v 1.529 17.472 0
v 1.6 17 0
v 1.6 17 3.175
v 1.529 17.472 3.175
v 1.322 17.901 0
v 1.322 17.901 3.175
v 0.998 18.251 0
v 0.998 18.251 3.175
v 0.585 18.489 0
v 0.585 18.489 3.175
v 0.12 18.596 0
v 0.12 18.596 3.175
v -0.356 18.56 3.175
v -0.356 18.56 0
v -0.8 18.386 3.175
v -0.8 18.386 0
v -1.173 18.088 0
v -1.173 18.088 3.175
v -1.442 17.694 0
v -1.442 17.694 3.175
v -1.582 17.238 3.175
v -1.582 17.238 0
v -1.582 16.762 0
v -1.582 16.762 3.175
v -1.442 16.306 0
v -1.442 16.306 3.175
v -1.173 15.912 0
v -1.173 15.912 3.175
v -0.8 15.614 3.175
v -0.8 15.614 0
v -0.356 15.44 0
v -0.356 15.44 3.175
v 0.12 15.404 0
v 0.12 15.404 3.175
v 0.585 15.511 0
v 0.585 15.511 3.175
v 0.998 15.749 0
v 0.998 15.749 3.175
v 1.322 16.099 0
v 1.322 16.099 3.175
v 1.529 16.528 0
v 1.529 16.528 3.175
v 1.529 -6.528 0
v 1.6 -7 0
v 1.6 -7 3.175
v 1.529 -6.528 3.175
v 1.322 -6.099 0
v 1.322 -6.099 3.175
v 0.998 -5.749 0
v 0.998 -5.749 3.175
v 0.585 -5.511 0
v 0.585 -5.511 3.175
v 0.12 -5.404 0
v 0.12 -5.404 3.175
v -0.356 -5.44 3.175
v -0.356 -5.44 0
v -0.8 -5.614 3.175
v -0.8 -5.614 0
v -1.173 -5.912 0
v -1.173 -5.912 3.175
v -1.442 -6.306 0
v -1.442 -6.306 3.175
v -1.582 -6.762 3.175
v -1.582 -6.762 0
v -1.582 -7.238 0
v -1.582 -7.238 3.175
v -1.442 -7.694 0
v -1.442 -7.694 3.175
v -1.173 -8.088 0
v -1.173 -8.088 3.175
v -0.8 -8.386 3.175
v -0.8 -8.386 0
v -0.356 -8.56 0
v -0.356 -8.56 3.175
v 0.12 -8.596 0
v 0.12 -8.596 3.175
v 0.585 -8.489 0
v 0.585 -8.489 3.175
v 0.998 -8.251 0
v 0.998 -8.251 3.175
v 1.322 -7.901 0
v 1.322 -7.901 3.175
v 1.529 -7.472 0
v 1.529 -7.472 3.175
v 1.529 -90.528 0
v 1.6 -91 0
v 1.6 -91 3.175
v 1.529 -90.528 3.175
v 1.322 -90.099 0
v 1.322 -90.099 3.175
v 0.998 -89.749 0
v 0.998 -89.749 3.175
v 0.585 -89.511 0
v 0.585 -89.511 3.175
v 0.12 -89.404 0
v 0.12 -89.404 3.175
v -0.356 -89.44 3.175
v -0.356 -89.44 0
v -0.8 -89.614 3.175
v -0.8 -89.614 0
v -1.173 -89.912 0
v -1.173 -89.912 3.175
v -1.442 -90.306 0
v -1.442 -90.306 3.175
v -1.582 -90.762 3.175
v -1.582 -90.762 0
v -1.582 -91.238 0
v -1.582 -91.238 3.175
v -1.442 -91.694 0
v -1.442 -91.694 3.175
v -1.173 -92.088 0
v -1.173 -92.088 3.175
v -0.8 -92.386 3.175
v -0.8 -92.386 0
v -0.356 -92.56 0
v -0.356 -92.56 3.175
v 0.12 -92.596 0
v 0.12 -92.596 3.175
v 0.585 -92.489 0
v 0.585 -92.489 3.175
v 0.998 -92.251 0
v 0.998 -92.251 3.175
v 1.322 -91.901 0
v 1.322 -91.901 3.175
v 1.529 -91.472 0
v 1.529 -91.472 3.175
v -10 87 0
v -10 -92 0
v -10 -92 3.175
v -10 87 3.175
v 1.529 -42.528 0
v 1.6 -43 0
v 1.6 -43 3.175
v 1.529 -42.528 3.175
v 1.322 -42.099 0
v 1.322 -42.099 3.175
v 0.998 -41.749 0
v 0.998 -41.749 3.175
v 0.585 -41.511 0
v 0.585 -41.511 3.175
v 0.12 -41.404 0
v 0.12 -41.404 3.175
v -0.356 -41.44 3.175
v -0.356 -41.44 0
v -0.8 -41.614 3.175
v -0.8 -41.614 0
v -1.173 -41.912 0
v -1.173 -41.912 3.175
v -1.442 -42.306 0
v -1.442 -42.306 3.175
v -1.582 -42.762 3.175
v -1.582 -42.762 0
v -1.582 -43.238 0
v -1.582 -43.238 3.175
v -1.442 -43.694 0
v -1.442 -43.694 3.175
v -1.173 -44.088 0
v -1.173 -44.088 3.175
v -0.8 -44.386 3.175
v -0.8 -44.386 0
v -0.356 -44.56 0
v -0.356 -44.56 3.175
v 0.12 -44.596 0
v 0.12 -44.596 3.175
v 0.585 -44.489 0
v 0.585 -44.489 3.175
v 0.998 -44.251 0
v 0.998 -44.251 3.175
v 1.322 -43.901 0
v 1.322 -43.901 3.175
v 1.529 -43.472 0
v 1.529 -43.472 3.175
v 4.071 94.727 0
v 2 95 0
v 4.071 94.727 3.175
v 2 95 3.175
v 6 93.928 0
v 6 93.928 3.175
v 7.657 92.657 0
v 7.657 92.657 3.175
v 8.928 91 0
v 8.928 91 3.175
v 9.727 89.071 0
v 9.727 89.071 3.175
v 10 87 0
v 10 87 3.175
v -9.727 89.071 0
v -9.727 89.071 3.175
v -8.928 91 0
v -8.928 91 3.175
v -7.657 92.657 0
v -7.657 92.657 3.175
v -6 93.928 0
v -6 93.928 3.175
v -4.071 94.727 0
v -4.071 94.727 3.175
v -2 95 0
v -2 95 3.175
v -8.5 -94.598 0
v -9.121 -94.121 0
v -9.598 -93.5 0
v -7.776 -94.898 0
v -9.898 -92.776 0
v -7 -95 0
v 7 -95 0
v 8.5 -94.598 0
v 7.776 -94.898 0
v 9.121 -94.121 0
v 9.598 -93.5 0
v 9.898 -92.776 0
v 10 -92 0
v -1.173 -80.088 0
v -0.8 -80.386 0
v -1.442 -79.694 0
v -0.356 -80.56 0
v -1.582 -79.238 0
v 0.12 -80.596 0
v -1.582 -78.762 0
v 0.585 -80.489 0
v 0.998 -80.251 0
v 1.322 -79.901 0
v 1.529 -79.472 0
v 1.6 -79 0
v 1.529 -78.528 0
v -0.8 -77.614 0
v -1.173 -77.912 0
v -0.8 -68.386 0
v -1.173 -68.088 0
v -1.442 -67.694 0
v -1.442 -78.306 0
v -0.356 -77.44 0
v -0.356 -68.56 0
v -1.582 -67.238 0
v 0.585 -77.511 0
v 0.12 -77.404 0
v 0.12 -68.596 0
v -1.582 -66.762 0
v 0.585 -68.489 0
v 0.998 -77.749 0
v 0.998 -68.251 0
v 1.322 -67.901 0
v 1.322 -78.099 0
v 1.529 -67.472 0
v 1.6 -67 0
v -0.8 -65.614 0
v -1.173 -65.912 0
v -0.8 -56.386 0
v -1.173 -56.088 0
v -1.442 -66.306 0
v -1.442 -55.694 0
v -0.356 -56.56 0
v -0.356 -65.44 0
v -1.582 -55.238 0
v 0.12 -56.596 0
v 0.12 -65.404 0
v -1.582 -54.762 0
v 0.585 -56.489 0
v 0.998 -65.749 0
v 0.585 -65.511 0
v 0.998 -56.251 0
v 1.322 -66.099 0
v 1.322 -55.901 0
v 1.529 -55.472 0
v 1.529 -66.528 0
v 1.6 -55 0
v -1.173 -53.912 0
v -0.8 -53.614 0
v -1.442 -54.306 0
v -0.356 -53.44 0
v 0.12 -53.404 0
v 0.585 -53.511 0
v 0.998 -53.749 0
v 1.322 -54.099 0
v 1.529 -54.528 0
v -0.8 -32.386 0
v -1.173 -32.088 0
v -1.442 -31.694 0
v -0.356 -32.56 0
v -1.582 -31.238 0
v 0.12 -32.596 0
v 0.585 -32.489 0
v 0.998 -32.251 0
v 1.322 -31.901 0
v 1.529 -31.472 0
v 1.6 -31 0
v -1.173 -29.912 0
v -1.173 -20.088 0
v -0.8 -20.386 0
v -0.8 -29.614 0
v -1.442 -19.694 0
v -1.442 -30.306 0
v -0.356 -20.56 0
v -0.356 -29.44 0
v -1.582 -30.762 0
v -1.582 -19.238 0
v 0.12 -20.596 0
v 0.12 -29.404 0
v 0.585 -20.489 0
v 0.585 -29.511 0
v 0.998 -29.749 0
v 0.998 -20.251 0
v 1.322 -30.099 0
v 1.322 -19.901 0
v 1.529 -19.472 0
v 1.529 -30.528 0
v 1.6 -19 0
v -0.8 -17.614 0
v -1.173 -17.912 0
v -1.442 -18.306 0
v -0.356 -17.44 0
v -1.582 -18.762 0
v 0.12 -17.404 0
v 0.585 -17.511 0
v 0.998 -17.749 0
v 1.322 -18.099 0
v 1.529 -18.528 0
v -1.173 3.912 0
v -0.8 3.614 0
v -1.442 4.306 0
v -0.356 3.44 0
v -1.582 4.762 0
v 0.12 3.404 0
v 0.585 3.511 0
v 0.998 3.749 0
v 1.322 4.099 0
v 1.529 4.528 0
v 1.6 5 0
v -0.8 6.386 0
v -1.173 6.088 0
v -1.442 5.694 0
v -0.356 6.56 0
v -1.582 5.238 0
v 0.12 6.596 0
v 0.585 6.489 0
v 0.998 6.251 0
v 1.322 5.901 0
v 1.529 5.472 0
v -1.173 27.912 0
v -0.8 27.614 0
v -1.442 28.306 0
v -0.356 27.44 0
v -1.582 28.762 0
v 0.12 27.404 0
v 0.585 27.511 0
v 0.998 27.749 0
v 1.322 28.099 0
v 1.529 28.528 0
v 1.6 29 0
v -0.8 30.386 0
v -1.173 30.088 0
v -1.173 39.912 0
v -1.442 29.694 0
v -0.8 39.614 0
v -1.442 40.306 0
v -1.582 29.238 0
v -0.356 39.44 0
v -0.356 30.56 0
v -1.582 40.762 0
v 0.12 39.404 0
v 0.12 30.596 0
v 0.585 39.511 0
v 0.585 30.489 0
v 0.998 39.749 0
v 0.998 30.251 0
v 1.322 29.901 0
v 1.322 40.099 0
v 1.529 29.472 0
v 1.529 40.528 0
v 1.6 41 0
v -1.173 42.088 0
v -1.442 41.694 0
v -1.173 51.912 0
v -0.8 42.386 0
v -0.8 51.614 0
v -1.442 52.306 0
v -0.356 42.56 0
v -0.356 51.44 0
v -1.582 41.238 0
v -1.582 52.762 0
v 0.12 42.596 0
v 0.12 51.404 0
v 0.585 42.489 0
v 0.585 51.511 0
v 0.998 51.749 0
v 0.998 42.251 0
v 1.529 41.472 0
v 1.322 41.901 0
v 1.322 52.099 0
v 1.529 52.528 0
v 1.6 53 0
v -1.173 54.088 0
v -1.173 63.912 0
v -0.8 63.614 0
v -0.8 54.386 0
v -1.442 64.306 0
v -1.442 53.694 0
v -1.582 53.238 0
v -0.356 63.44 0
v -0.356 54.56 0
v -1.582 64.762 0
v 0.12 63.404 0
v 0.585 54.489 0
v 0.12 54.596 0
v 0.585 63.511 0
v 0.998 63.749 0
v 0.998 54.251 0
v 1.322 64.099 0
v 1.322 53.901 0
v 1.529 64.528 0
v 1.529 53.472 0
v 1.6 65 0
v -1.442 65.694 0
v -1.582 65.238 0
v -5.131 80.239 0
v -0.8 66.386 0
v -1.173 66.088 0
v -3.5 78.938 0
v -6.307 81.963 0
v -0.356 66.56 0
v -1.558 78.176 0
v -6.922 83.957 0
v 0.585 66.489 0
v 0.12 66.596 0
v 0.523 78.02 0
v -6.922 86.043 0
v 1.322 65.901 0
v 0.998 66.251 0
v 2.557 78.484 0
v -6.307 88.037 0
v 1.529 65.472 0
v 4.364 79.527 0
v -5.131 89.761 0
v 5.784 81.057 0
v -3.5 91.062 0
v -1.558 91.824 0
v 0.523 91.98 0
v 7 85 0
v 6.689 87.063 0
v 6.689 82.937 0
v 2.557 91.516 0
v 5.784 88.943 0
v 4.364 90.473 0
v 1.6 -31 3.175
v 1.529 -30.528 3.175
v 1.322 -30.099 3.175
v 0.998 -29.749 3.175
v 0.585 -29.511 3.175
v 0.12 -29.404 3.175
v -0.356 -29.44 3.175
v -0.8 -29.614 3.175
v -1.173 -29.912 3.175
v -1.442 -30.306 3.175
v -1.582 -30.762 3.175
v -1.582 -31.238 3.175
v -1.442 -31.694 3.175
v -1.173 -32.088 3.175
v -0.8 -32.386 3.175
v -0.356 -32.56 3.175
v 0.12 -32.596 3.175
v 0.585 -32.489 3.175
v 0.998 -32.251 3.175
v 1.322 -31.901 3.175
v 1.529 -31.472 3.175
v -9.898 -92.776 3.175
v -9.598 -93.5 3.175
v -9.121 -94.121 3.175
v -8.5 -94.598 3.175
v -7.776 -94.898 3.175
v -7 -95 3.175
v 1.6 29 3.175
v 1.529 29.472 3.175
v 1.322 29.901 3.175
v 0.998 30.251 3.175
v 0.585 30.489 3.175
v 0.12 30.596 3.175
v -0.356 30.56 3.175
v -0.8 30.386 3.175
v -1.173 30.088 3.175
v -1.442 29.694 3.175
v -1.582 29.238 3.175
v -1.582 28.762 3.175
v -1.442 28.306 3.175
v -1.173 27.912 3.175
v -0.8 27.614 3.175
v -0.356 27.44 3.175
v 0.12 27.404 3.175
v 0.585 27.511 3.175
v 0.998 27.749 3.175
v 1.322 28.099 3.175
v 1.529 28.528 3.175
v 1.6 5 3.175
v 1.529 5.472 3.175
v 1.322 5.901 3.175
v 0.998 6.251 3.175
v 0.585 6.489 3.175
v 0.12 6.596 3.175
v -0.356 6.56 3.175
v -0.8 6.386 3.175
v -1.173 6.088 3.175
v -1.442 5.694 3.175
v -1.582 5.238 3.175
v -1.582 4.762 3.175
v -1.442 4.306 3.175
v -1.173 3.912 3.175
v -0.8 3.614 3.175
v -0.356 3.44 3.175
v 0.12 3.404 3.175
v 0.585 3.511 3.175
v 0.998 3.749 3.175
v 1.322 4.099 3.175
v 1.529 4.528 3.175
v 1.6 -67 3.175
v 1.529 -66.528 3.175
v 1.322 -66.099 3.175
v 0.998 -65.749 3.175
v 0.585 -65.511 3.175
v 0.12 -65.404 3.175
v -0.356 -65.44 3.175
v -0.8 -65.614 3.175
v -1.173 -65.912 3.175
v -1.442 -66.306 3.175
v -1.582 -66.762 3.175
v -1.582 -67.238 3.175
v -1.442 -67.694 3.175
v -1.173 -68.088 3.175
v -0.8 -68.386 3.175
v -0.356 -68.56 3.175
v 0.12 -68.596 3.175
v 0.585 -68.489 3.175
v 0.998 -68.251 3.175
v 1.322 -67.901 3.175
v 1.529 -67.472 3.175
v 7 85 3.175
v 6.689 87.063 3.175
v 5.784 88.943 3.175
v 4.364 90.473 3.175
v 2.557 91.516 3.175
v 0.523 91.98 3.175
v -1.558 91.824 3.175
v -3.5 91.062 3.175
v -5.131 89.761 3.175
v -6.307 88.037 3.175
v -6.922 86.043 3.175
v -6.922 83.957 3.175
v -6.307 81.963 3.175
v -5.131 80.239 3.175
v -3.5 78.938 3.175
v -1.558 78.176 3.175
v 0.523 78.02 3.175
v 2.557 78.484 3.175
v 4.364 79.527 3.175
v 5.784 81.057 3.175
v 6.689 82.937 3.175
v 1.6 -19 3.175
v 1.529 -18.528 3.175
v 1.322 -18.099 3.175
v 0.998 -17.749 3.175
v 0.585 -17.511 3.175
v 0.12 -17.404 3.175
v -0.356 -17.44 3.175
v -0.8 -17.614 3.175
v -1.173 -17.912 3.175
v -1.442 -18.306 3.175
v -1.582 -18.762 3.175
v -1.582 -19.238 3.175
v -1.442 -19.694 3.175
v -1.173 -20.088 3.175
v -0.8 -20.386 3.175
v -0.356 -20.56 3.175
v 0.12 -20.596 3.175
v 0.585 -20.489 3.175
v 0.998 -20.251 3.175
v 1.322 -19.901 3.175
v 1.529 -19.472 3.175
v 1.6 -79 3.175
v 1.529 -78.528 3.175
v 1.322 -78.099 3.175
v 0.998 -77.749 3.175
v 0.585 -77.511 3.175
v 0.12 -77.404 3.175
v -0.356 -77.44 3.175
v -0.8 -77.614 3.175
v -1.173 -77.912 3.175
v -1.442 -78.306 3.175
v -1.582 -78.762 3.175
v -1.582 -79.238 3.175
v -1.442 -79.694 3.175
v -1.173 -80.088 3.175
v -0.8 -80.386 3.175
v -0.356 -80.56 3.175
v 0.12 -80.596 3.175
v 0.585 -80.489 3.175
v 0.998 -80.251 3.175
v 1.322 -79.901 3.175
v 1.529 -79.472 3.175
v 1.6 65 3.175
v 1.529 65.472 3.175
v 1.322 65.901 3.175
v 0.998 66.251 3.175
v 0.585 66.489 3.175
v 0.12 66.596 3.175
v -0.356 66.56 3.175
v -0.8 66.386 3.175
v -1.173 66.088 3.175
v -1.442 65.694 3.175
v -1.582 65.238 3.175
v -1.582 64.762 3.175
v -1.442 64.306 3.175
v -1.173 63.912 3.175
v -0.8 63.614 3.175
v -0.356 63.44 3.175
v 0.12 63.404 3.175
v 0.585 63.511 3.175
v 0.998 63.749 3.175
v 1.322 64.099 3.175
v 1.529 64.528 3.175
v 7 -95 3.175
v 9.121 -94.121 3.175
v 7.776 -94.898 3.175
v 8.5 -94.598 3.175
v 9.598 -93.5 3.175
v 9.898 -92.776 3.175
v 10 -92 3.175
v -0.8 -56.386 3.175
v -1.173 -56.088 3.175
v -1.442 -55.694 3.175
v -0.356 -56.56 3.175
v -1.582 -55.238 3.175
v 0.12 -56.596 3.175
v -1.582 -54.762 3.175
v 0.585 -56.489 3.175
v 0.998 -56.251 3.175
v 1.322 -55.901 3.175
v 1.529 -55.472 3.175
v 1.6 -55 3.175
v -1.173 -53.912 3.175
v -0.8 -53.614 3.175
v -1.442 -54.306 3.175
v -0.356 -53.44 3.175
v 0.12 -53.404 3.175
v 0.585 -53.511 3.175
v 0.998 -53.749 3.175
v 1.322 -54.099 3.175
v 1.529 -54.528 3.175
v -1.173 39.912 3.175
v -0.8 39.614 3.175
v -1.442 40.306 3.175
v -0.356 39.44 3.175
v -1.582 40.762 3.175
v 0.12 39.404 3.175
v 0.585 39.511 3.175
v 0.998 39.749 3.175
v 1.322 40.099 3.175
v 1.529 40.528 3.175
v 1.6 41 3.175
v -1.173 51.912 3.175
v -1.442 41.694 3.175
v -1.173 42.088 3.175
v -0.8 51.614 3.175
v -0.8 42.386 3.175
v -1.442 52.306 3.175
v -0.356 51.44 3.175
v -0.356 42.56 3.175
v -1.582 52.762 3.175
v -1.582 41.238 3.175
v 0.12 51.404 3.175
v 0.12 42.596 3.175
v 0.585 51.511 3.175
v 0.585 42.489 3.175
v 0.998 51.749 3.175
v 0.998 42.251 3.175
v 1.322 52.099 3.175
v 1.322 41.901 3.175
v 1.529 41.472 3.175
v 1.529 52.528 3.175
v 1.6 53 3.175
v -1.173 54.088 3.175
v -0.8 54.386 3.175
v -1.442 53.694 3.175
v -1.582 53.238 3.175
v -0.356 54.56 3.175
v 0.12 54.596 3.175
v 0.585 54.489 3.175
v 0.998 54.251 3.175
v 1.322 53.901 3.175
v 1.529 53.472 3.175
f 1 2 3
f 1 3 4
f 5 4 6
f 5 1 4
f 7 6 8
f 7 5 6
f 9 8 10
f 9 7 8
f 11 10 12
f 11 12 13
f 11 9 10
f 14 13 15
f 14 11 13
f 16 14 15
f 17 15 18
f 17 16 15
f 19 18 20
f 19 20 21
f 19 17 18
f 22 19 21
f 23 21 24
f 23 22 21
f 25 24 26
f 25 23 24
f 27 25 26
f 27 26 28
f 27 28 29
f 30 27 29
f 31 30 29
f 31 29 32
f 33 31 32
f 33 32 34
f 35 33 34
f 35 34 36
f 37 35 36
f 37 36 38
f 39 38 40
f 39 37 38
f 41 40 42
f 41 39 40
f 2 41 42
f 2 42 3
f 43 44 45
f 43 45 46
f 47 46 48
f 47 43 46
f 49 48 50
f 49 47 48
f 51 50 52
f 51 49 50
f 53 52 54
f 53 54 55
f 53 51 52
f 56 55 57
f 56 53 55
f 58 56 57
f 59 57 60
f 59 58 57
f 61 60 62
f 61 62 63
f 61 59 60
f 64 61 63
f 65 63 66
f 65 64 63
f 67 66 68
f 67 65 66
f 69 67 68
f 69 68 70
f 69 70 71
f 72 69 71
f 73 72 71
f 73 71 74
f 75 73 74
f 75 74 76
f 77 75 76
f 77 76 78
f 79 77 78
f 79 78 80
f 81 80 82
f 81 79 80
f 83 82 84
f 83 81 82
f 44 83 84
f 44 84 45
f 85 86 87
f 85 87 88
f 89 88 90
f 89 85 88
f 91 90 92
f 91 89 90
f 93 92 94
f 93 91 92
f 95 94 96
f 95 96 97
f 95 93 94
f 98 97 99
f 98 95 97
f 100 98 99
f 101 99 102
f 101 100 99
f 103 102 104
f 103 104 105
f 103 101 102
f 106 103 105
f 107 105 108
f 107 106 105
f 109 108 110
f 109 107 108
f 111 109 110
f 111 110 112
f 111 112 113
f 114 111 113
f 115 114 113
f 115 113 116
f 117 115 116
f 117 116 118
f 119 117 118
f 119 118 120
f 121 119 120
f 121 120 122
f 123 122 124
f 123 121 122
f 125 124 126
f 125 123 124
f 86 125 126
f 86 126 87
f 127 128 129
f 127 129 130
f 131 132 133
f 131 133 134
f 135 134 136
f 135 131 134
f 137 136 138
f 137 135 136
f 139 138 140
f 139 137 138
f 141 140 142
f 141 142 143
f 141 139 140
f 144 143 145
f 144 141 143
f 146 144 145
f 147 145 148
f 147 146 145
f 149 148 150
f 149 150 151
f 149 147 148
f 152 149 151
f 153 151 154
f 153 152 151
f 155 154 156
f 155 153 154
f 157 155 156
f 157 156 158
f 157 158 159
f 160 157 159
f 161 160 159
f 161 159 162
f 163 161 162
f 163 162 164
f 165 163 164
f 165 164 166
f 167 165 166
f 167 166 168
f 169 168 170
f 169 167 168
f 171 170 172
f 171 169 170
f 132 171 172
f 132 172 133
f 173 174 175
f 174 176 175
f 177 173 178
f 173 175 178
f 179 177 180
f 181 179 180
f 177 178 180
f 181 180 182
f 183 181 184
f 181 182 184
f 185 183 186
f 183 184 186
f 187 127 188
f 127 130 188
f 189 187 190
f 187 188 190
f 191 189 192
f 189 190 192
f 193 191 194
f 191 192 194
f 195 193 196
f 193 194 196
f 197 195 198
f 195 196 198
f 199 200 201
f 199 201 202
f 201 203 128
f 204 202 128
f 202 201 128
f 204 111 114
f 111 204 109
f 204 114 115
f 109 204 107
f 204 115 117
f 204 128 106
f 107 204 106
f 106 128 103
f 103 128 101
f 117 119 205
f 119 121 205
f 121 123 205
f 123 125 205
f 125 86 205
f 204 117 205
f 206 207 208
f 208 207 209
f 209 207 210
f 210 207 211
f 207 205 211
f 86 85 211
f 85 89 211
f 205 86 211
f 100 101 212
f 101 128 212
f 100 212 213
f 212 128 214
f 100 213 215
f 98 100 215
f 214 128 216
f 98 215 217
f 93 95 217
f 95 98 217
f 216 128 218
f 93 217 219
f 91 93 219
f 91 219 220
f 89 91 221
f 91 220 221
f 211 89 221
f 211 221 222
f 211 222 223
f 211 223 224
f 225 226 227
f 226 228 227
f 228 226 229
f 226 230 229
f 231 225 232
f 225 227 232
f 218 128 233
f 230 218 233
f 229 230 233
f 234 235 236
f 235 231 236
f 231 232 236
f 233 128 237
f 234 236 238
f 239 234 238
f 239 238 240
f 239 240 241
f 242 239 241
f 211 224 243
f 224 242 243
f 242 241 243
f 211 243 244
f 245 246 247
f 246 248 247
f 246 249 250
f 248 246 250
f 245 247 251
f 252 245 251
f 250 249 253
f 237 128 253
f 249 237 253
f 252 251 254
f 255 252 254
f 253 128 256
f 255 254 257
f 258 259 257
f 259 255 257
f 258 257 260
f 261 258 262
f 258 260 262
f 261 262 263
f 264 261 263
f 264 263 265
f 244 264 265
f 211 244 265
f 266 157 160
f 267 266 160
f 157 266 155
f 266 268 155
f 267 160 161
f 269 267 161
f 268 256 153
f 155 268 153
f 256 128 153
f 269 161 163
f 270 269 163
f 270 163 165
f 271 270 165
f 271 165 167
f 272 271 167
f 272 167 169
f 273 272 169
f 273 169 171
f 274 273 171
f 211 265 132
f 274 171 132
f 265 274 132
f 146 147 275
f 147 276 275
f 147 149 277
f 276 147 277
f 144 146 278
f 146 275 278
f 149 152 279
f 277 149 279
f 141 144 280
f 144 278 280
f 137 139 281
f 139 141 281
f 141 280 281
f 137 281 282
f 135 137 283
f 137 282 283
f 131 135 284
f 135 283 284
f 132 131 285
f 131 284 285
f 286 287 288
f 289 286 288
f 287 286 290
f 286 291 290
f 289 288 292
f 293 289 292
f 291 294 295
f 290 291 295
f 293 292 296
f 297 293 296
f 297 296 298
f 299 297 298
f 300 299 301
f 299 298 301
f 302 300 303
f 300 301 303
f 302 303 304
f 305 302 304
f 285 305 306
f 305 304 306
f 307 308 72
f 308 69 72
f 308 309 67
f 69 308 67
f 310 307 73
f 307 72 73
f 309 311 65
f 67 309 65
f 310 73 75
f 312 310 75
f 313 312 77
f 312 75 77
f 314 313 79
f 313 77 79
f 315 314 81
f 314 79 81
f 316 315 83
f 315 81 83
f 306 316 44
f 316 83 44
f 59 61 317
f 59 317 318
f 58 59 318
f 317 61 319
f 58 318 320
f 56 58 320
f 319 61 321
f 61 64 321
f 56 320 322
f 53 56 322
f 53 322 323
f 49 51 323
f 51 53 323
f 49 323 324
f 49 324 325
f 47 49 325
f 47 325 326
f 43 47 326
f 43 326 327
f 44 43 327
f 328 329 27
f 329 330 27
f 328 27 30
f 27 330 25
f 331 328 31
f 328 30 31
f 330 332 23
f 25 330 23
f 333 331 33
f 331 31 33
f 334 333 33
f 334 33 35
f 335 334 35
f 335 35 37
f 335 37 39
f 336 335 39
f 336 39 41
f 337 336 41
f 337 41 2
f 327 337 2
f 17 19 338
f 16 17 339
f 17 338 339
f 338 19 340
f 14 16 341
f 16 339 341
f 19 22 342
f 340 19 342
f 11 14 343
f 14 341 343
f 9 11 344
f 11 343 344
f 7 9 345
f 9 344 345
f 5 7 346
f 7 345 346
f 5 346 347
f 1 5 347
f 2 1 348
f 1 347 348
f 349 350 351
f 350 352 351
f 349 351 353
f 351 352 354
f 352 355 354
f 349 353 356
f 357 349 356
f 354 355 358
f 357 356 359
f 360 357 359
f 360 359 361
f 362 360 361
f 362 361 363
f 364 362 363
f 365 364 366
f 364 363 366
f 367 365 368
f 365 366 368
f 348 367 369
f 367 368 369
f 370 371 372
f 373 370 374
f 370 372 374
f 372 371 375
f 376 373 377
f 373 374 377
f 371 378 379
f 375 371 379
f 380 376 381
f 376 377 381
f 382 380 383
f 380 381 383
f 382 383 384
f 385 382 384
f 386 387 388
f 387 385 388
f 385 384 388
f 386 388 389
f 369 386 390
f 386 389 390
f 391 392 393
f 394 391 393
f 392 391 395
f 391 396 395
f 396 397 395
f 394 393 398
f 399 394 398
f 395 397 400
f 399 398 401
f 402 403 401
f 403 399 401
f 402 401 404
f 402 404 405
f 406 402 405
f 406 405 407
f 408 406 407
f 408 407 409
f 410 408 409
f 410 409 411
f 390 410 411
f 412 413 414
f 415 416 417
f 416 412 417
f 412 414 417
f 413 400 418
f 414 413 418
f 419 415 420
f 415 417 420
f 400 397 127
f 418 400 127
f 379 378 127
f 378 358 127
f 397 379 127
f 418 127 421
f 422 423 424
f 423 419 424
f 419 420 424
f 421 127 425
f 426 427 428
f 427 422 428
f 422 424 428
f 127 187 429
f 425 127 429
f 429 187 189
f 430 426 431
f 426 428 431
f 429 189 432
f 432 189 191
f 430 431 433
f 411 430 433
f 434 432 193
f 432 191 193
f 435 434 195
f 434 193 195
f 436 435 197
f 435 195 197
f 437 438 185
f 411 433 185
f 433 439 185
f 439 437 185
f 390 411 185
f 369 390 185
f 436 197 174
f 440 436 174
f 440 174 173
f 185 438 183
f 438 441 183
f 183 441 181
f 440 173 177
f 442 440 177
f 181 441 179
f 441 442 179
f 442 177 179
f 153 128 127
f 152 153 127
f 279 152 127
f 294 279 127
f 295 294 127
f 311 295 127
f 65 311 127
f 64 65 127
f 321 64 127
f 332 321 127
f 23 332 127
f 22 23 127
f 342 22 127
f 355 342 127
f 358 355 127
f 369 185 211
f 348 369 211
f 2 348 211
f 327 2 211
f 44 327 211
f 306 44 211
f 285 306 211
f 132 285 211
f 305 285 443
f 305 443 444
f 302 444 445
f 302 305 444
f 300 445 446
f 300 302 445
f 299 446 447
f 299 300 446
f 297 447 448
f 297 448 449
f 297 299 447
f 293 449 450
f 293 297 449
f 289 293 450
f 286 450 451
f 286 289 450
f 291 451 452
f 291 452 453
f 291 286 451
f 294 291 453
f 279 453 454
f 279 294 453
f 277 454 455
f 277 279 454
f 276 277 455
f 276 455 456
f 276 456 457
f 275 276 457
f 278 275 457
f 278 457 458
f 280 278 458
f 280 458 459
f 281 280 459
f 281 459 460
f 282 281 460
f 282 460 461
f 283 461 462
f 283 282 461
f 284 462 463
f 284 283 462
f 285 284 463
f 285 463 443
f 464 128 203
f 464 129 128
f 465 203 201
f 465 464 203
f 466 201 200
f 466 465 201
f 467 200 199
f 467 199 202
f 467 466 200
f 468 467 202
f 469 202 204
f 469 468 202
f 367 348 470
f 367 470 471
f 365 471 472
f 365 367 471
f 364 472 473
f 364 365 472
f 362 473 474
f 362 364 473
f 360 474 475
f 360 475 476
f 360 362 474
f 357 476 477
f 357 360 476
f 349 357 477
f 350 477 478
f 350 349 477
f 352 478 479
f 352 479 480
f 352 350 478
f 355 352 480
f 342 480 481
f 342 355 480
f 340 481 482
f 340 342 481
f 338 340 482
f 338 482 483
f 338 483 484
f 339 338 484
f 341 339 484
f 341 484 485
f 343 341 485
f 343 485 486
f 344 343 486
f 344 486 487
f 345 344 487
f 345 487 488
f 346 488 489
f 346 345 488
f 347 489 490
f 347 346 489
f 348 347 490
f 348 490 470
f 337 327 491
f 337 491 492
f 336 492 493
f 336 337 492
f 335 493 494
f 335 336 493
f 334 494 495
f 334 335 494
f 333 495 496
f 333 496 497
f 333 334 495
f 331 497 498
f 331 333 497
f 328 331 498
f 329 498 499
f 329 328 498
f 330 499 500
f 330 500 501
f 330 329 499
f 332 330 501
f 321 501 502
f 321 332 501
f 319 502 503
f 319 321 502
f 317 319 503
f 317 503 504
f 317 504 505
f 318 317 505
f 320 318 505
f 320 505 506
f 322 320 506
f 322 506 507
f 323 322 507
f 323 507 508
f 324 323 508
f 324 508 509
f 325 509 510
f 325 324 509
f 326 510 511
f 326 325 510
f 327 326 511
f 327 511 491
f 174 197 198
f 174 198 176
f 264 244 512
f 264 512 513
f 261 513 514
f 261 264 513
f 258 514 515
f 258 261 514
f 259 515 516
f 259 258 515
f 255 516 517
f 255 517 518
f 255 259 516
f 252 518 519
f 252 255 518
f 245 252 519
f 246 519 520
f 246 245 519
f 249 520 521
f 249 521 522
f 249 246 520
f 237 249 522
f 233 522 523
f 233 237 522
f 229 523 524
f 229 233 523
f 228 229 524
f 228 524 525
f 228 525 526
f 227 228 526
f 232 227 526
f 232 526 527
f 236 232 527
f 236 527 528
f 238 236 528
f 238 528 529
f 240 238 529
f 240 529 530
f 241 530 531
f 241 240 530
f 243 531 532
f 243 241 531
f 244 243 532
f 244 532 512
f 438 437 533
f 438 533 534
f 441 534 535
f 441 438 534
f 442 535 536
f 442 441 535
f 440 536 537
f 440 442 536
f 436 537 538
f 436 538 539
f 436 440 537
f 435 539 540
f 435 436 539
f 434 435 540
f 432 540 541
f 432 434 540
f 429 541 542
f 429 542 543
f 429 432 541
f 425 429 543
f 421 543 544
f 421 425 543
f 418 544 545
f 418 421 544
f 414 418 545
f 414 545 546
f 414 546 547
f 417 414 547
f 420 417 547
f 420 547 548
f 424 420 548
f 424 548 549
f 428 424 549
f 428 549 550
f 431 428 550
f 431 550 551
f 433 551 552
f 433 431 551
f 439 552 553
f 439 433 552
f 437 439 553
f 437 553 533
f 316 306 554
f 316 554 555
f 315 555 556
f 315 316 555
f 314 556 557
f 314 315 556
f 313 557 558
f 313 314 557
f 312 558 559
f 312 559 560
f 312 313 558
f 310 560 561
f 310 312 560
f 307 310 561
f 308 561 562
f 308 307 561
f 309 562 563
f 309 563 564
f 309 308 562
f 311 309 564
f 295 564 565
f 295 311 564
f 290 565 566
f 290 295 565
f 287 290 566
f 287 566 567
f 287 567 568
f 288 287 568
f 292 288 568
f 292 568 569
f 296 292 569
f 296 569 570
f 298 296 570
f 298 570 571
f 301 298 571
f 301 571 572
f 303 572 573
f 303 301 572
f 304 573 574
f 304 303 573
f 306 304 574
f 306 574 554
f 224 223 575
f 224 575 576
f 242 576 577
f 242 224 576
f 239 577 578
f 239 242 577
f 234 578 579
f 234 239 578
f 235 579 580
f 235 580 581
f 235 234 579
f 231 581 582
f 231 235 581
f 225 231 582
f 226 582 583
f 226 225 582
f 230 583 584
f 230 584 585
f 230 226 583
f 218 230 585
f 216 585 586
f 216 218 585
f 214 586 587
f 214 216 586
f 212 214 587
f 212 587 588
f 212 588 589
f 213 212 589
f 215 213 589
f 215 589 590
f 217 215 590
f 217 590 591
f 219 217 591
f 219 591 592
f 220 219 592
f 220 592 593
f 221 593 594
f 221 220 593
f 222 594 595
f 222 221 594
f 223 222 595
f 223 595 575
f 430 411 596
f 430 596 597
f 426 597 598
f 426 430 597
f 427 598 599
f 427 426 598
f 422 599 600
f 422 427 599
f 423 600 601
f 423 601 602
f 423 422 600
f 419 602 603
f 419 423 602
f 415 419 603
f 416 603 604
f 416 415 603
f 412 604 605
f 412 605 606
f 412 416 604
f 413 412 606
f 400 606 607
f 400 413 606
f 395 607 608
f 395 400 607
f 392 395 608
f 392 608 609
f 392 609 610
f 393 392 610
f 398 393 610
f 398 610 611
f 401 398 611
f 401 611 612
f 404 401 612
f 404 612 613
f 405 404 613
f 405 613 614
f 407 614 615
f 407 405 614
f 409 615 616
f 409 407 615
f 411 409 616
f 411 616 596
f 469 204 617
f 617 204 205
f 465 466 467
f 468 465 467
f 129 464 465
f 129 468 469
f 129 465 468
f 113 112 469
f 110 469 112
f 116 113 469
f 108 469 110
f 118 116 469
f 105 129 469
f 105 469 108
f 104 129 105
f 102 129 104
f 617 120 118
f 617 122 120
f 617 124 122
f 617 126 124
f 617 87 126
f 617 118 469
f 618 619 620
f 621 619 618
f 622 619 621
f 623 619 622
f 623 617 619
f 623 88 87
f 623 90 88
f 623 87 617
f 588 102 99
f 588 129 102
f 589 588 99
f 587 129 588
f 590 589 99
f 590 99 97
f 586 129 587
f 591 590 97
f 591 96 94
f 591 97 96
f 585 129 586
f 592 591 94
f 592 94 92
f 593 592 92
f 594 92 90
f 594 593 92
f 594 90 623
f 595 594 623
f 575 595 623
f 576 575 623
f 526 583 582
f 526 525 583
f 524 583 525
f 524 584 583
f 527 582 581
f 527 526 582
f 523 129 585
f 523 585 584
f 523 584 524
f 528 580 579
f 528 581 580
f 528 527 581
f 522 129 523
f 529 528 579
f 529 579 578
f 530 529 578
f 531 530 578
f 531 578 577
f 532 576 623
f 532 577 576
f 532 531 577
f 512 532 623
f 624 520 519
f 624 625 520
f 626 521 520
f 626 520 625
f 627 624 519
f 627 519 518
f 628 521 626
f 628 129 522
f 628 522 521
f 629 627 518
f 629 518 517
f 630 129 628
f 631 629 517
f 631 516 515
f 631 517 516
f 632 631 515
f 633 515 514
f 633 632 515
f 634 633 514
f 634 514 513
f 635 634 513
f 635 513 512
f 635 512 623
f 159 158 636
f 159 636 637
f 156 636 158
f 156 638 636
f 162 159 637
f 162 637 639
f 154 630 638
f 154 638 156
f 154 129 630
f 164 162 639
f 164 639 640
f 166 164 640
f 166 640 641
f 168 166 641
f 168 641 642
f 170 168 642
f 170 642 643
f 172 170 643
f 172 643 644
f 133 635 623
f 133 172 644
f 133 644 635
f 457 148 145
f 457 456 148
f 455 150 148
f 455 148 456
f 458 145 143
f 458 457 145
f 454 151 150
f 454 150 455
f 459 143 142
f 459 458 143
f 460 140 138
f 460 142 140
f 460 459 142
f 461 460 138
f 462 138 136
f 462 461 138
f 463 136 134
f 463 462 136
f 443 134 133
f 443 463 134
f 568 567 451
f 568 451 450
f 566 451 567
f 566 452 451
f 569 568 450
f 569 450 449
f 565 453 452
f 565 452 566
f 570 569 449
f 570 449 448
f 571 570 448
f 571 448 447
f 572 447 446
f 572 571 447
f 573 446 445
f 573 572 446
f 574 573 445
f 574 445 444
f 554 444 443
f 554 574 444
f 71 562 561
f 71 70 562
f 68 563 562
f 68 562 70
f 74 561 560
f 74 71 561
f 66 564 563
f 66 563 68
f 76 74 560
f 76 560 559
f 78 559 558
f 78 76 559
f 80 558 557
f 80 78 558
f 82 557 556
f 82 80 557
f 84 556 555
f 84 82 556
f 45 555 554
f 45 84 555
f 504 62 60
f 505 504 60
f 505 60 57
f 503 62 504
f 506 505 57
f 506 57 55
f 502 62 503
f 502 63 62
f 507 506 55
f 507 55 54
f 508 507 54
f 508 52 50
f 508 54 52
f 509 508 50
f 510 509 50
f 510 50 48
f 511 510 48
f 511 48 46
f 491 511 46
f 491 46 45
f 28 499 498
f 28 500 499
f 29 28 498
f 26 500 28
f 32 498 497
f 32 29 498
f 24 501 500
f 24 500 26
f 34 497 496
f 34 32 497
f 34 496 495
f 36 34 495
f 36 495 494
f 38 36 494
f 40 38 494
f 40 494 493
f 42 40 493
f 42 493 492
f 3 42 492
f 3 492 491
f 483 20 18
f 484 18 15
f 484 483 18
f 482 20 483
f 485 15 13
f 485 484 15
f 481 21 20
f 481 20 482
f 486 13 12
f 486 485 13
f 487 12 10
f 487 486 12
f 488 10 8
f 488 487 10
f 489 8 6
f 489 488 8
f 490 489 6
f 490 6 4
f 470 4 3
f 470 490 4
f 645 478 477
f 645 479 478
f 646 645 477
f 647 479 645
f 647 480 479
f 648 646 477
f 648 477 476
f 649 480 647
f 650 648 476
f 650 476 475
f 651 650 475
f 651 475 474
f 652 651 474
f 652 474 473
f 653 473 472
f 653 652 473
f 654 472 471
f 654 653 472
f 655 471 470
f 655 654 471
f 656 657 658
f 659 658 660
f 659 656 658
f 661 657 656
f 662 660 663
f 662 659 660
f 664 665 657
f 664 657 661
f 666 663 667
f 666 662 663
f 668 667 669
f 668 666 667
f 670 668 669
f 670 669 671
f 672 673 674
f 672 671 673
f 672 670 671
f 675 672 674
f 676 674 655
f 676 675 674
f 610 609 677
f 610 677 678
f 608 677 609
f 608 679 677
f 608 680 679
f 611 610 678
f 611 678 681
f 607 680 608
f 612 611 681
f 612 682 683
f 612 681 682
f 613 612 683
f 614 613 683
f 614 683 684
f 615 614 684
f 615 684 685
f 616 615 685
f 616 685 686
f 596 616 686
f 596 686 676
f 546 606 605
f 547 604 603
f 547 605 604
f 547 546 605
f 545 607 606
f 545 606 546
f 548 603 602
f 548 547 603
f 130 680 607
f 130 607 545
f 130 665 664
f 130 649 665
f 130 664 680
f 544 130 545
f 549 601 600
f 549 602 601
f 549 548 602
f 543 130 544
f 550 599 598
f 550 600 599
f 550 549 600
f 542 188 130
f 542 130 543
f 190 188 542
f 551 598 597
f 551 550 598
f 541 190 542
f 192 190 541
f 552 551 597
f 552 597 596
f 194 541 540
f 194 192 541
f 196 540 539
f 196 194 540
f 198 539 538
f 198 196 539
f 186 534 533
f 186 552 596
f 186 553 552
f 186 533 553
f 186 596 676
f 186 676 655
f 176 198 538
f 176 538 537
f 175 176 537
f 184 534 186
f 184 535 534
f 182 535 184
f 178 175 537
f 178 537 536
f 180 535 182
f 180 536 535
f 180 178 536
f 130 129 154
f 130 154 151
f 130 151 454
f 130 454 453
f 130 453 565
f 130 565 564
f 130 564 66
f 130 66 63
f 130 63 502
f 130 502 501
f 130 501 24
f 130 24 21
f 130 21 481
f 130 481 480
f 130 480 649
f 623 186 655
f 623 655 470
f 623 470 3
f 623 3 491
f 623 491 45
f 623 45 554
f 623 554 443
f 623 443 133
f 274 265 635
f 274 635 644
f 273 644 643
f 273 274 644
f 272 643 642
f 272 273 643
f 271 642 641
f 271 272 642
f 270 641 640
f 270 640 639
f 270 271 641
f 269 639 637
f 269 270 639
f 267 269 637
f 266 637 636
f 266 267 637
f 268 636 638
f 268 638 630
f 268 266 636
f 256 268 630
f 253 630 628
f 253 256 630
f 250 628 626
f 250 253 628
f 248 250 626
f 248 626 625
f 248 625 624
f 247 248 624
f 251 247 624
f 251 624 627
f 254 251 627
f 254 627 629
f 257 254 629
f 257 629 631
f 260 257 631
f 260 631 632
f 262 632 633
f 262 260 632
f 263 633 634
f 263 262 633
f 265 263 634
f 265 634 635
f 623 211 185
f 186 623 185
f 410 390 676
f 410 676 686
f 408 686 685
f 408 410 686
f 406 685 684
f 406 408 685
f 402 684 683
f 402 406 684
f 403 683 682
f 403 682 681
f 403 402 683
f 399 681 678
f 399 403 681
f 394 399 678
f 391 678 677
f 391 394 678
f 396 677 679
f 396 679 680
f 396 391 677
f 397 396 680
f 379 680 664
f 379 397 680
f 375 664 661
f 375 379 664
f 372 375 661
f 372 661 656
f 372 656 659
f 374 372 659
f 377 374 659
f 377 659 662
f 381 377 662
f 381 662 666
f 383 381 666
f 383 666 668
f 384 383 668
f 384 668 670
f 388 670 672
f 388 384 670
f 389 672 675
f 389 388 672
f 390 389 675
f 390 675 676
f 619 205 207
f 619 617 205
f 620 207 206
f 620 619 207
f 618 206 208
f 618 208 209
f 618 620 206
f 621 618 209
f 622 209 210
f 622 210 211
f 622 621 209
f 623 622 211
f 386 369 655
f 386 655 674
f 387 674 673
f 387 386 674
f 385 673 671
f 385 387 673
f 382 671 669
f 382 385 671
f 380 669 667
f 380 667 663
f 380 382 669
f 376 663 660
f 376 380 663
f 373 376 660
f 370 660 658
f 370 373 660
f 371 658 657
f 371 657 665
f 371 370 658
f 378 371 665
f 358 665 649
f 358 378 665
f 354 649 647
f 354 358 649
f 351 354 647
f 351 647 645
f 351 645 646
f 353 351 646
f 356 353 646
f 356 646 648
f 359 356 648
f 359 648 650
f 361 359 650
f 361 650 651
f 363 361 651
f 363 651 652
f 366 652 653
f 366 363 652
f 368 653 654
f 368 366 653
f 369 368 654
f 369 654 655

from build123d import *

# Parameters (mm, degrees)
SKETCH1_W           = 20
SKETCH1_H           = 190
SKETCH1_R           = 1.6
SKETCH1_R_2         = 7
BOSS_EXTRUDE1_DEPTH = 3.175
FILLET1_R           = 3
FILLET2_R           = 8


with BuildPart() as part:
    # Sketch1 → Boss-Extrude1 (new body)
    with BuildSketch(Plane.XY):
        Rectangle(SKETCH1_W, SKETCH1_H)
        with Locations((0, -91)):
            Circle(SKETCH1_R, mode=Mode.SUBTRACT)
        with Locations((0, -79)):
            Circle(SKETCH1_R, mode=Mode.SUBTRACT)
        with Locations((0, -67)):
            Circle(SKETCH1_R, mode=Mode.SUBTRACT)
        with Locations((0, -55)):
            Circle(SKETCH1_R, mode=Mode.SUBTRACT)
        with Locations((0, -43)):
            Circle(SKETCH1_R, mode=Mode.SUBTRACT)
        with Locations((0, -31)):
            Circle(SKETCH1_R, mode=Mode.SUBTRACT)
        with Locations((0, -19)):
            Circle(SKETCH1_R, mode=Mode.SUBTRACT)
        with Locations((0, 85)):
            Circle(SKETCH1_R_2, mode=Mode.SUBTRACT)
        with Locations((0, -7)):
            Circle(SKETCH1_R, mode=Mode.SUBTRACT)
        with Locations((0, 5)):
            Circle(SKETCH1_R, mode=Mode.SUBTRACT)
        with Locations((0, 17)):
            Circle(SKETCH1_R, mode=Mode.SUBTRACT)
        with Locations((0, 29)):
            Circle(SKETCH1_R, mode=Mode.SUBTRACT)
        with Locations((0, 41)):
            Circle(SKETCH1_R, mode=Mode.SUBTRACT)
        with Locations((0, 53)):
            Circle(SKETCH1_R, mode=Mode.SUBTRACT)
        with Locations((0, 65)):
            Circle(SKETCH1_R, mode=Mode.SUBTRACT)
    extrude(amount=BOSS_EXTRUDE1_DEPTH)

    # Fillet1
    fillet1_edges = [part.edges().sort_by_distance(p)[0] for p in [
        (10, -95, 1.5875),
        (-10, -95, 1.5875),
    ]]
    fillet(fillet1_edges, radius=FILLET1_R)

    # Fillet2
    fillet2_edges = [part.edges().sort_by_distance(p)[0] for p in [
        (-10, 95, 1.5875),
        (10, 95, 1.5875),
    ]]
    fillet(fillet2_edges, radius=FILLET2_R)


solid = part.part
